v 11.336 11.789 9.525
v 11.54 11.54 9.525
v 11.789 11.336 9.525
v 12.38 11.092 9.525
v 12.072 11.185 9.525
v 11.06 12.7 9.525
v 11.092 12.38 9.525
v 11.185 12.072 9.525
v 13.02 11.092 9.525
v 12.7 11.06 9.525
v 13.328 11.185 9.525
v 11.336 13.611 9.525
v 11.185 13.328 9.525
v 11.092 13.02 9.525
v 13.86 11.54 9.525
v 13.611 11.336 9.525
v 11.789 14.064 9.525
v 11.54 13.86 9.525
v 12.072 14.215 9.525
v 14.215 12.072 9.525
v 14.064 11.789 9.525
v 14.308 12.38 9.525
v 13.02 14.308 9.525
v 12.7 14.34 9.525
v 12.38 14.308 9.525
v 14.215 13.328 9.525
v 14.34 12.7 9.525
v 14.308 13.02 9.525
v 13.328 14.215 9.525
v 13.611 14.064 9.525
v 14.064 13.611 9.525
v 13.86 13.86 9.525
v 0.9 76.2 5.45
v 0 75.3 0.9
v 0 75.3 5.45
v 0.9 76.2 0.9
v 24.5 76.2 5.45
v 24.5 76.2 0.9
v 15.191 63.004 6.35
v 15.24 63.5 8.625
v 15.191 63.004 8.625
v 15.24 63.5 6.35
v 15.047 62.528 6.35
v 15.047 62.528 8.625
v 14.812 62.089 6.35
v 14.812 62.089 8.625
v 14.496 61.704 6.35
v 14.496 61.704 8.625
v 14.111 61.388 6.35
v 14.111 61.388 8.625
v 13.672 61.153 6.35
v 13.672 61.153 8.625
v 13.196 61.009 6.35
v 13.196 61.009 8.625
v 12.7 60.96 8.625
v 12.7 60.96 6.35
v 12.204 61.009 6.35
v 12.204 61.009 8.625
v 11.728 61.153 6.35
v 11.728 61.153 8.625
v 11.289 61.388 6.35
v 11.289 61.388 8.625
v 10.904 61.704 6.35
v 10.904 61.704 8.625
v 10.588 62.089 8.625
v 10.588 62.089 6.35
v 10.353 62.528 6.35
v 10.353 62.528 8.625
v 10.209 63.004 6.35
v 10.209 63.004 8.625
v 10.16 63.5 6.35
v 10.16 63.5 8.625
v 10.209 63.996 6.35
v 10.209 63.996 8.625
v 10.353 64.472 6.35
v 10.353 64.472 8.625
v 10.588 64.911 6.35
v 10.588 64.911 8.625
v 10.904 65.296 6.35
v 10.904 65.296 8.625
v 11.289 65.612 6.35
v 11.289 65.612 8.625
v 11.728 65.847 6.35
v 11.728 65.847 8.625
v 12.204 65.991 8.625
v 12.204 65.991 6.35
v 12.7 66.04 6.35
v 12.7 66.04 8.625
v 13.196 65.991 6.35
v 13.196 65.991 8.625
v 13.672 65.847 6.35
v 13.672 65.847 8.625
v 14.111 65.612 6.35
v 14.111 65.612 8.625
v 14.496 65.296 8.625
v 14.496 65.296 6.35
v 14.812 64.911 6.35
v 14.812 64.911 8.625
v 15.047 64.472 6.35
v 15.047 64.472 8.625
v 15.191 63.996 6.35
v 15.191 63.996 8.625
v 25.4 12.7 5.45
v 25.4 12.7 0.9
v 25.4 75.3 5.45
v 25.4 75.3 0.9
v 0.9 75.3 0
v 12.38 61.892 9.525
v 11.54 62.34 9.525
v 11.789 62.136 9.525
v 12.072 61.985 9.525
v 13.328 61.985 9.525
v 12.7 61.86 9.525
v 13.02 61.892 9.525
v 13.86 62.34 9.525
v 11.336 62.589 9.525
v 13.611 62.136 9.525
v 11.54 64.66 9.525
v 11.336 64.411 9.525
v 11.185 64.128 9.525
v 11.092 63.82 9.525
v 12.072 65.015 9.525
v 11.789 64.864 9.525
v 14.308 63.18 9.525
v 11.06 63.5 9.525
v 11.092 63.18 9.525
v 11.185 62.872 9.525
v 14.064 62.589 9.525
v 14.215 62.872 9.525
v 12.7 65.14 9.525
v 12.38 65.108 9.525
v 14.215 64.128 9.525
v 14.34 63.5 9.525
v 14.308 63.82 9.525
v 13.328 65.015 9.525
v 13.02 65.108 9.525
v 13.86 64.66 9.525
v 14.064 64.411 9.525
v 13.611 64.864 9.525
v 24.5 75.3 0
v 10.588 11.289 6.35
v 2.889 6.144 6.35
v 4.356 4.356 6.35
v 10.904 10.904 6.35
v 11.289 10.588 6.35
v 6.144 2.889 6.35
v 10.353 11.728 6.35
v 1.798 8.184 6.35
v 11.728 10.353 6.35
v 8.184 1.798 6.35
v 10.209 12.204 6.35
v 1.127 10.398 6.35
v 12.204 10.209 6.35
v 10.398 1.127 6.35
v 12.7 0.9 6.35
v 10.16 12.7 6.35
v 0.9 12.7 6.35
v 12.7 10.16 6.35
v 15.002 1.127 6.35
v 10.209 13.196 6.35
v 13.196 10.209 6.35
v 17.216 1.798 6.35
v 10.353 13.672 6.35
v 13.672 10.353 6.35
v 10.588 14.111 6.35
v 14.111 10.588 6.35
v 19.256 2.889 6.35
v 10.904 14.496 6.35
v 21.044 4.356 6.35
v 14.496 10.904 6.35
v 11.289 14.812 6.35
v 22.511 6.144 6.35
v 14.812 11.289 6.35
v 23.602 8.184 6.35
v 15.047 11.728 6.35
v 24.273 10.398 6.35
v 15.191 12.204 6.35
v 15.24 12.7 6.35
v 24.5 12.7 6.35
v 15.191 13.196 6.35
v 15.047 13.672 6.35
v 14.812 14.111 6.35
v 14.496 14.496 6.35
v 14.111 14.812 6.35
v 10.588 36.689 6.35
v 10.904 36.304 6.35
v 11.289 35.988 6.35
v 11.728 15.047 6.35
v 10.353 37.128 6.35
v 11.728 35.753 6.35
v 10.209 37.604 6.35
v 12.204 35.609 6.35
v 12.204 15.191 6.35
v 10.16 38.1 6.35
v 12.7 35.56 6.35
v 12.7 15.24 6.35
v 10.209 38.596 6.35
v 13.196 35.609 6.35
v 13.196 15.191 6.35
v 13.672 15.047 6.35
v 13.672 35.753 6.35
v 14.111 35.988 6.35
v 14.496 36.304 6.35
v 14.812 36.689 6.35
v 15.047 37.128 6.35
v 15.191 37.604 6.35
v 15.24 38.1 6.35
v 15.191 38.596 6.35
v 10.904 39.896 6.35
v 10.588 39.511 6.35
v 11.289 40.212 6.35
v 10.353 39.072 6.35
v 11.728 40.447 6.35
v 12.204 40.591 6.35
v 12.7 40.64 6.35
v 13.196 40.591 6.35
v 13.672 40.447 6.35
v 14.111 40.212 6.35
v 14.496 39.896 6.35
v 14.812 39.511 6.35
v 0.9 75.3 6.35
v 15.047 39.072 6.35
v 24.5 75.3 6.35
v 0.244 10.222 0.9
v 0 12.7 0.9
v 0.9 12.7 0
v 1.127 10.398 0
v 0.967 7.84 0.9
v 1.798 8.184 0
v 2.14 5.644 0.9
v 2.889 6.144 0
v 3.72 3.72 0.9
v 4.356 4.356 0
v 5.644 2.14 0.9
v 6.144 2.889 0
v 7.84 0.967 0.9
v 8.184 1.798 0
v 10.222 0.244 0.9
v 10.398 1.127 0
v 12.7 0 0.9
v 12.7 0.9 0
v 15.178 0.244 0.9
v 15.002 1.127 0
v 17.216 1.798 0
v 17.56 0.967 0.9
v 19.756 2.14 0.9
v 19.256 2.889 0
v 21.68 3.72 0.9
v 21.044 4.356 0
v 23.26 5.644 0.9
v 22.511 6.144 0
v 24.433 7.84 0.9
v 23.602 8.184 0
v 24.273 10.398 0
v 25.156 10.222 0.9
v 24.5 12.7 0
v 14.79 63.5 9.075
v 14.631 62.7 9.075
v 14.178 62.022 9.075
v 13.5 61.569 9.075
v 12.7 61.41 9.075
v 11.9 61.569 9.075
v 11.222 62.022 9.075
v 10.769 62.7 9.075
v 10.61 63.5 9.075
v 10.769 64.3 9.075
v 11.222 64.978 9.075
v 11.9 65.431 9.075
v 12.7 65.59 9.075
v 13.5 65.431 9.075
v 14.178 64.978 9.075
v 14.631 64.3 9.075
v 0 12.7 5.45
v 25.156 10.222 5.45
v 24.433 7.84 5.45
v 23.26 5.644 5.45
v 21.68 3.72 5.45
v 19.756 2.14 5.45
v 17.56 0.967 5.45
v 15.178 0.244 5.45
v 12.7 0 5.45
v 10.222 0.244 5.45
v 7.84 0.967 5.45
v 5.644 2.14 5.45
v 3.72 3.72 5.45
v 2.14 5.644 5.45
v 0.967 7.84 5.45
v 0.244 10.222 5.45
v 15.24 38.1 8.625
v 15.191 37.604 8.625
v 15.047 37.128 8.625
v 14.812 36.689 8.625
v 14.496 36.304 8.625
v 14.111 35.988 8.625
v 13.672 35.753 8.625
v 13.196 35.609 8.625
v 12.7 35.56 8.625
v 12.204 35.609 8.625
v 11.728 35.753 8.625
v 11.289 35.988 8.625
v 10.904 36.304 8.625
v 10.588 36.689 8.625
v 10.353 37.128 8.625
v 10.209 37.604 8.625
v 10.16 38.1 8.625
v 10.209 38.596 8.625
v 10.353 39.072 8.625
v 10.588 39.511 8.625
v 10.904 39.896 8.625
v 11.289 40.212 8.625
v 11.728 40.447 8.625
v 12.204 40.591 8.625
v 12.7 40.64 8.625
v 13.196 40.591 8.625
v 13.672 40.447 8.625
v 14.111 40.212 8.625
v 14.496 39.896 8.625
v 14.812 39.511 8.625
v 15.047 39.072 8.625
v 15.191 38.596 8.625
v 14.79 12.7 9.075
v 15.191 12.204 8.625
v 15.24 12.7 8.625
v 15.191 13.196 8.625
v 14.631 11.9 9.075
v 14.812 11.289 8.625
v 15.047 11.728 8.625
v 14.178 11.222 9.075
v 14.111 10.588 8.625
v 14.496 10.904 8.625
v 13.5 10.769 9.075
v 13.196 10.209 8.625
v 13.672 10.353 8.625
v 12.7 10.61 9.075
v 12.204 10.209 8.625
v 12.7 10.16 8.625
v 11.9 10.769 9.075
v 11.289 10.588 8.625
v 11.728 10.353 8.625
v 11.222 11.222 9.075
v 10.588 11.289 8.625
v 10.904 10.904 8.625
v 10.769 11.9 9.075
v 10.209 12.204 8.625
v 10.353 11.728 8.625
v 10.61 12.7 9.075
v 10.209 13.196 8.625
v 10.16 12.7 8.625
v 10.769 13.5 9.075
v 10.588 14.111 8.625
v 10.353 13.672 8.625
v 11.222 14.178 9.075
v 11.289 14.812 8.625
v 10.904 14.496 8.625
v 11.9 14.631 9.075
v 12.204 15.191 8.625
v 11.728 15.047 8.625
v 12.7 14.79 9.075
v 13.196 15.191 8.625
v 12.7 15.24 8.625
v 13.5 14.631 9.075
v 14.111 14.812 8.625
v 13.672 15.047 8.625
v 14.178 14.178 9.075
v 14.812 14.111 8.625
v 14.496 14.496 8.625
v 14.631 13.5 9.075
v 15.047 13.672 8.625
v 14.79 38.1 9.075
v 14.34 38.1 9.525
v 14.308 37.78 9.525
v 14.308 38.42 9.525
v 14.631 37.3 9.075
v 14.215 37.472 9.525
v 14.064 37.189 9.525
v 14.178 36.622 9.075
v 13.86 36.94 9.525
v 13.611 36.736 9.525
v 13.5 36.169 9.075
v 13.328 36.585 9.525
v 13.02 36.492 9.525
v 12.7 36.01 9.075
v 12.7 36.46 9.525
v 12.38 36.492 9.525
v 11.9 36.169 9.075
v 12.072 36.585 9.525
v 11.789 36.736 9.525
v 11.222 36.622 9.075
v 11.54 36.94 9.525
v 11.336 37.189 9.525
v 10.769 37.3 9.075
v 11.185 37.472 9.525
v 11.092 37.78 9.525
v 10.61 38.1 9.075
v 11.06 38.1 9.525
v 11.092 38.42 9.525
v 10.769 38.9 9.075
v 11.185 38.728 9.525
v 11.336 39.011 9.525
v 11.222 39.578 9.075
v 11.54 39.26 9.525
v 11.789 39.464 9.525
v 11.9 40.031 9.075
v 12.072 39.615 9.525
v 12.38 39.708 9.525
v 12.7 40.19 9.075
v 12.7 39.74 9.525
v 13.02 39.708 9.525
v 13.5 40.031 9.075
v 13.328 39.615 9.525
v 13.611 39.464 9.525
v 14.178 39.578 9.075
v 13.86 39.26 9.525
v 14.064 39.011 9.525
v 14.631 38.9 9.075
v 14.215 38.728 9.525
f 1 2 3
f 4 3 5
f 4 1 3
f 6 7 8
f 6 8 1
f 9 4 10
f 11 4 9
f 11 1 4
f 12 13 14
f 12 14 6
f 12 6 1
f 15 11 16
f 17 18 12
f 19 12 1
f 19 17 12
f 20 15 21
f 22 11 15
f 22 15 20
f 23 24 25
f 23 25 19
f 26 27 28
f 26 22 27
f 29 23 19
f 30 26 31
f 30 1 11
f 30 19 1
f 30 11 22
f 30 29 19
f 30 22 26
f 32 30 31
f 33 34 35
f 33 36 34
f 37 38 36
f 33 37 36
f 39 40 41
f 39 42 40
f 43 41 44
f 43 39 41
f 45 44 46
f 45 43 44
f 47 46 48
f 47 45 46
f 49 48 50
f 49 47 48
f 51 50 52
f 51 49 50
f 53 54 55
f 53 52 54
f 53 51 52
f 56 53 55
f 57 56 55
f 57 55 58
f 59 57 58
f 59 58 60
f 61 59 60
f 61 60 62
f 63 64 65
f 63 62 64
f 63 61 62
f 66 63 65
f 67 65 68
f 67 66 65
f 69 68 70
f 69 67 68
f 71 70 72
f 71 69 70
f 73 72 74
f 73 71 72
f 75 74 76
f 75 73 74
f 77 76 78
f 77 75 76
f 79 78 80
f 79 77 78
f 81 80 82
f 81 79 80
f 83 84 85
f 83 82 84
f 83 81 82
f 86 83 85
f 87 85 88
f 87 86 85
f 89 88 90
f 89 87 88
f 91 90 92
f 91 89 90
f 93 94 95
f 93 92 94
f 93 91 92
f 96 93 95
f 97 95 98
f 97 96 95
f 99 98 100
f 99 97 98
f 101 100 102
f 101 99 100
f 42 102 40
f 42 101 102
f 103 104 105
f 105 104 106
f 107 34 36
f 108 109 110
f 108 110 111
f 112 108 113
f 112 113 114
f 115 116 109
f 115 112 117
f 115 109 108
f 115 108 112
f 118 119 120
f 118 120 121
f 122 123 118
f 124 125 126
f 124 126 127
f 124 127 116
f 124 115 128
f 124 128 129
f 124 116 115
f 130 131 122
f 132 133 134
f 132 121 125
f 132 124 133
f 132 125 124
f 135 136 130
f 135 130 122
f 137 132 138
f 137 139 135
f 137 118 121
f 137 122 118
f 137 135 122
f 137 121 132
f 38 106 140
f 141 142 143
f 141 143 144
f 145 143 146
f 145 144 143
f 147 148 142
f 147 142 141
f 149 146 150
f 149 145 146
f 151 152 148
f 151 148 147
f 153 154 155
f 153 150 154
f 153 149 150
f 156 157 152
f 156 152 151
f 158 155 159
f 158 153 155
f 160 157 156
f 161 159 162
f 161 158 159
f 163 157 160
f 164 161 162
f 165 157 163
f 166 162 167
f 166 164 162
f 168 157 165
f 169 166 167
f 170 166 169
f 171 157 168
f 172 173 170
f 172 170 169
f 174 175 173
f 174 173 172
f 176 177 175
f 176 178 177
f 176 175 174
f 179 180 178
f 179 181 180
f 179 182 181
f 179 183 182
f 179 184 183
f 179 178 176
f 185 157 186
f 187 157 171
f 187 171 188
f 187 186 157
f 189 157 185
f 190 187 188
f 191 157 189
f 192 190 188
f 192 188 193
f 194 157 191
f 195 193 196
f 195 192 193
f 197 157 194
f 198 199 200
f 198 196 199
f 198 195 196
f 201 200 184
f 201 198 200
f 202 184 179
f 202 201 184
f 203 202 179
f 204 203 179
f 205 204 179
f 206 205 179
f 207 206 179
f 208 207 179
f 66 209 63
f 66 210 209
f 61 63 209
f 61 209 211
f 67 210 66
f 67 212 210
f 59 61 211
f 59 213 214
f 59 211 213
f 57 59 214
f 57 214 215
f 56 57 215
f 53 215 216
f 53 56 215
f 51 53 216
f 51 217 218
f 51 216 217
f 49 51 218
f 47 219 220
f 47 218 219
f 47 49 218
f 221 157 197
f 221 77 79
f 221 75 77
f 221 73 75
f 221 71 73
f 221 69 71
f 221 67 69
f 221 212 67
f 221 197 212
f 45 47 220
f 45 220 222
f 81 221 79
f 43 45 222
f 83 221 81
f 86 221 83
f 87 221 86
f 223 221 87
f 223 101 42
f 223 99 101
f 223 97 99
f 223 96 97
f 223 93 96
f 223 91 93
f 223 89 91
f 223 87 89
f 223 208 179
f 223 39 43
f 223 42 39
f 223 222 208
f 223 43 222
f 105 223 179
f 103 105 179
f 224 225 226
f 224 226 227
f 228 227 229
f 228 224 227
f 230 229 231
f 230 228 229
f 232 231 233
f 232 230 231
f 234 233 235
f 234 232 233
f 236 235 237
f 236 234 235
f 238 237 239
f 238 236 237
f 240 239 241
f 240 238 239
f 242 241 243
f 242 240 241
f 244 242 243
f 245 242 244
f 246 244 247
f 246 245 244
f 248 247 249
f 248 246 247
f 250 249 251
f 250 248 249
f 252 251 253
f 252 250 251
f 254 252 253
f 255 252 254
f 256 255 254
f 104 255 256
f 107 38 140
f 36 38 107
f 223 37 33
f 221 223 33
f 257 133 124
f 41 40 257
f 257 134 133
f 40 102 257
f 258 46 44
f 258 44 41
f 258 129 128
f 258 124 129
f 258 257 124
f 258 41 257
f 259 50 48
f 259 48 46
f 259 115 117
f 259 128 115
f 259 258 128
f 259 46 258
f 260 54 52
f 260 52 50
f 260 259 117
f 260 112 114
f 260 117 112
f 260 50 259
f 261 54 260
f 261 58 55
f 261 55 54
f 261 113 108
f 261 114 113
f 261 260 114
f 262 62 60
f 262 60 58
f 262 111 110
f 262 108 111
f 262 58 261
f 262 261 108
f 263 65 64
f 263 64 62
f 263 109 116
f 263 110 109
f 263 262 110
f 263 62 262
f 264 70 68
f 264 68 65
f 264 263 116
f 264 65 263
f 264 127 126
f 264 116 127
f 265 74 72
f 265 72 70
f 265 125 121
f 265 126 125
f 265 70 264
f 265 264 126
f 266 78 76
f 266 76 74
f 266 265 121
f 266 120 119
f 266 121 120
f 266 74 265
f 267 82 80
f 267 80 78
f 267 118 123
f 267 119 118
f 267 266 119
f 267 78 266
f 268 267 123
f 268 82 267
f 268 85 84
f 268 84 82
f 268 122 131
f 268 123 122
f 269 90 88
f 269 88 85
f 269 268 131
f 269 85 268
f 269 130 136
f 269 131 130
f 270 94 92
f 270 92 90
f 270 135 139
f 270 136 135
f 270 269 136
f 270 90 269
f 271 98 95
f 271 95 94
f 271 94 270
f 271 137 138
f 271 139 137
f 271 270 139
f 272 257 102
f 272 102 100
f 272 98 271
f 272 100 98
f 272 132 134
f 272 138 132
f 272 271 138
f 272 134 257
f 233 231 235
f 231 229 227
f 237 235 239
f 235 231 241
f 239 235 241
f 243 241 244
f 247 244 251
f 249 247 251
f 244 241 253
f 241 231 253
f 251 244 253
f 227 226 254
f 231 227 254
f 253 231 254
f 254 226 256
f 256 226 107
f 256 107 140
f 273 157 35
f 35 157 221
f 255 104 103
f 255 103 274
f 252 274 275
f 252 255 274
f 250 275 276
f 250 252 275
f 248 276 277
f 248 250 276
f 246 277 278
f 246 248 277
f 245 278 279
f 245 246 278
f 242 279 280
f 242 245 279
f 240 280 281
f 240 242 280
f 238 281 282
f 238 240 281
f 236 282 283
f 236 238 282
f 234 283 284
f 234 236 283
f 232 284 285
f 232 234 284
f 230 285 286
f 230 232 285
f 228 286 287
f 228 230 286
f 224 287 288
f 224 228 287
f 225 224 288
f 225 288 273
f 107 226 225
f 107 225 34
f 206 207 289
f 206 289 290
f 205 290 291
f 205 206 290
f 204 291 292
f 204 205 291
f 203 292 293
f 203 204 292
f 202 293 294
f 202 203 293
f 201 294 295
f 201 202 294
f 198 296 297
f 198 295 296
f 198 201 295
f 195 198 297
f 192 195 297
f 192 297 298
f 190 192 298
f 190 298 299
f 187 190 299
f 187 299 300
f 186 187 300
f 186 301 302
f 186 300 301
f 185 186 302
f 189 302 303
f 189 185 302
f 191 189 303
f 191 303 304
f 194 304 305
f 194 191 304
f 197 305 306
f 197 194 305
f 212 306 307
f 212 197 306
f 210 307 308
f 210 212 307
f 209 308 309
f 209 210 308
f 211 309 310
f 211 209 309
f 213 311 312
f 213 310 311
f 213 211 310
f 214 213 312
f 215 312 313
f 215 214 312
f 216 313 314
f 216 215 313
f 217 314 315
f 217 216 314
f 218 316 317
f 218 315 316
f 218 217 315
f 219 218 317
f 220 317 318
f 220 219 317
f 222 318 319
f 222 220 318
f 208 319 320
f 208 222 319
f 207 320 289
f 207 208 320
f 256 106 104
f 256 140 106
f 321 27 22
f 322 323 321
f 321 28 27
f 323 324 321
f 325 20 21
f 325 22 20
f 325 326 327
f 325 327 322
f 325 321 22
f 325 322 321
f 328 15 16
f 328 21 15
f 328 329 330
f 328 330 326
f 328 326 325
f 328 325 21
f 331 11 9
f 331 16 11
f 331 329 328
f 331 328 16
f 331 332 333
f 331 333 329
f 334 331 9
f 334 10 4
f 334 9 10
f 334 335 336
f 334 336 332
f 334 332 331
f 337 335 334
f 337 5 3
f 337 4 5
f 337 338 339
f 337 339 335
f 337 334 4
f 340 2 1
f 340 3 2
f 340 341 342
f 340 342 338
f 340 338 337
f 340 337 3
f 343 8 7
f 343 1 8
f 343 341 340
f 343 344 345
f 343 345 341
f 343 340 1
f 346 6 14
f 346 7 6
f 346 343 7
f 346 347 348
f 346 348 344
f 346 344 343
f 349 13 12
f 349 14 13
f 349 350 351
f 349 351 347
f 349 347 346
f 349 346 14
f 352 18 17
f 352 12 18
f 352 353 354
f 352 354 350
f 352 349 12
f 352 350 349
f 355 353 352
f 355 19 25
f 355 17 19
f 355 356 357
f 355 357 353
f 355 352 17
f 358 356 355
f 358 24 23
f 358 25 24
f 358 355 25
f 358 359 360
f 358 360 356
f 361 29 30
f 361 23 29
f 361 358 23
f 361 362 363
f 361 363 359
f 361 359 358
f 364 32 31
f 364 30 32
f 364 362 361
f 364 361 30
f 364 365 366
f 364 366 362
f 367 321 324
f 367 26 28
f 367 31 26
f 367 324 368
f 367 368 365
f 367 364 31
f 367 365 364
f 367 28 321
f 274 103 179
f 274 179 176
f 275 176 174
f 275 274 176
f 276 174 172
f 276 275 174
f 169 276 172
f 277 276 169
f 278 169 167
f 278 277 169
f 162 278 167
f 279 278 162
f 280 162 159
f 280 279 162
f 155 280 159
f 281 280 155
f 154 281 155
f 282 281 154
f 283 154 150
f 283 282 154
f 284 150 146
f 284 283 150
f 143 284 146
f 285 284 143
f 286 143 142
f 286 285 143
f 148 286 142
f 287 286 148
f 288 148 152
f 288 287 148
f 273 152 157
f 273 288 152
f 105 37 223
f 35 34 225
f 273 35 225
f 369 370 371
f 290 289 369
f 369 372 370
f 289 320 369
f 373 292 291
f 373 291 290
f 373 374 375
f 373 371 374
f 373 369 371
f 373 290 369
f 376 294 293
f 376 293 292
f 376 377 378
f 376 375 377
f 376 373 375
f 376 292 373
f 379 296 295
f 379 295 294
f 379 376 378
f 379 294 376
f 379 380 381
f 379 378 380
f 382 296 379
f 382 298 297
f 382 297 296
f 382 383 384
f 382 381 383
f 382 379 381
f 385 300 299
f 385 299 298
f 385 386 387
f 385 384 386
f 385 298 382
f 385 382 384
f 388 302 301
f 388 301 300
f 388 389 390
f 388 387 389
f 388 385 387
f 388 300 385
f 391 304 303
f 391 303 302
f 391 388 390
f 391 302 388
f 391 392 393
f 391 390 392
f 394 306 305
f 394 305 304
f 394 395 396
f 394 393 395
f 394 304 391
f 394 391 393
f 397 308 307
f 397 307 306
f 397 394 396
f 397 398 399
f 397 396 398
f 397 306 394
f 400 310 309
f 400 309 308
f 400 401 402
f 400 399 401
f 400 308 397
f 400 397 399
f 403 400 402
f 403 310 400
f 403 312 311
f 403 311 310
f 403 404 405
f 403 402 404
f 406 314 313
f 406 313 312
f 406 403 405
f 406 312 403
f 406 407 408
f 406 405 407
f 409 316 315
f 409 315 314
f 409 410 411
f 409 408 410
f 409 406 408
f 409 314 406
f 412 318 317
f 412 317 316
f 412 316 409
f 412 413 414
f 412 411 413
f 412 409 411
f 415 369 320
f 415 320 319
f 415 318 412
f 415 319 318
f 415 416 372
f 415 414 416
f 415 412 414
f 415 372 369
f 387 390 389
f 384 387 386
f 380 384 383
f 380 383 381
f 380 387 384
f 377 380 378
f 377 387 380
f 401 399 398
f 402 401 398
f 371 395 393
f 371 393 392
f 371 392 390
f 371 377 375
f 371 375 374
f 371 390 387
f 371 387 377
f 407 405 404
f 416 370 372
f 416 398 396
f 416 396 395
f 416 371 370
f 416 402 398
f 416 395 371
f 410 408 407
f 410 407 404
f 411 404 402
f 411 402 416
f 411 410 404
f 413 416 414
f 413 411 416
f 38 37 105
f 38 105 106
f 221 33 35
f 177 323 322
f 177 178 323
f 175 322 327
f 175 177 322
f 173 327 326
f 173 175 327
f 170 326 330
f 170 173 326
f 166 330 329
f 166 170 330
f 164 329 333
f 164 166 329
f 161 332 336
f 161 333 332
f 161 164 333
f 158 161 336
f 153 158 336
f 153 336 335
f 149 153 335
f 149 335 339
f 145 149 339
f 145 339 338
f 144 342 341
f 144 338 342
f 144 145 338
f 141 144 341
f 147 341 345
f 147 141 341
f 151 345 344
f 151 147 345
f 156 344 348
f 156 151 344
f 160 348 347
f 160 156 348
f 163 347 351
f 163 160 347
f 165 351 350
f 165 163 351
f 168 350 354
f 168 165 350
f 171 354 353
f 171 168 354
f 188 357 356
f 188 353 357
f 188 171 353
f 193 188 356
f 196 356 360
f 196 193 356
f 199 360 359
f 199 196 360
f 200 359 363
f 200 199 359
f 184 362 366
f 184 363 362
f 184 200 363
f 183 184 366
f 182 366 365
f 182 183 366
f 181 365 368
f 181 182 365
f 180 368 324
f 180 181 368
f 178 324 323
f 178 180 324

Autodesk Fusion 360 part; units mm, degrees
sketch "Sketch1" plane through (0, 0, 0) normal (0, 0, 1) x (1, 0, 0)
  line L0 (0, 0) -> (25.4, 0)
  line L1 (25.4, 0) -> (25.4, 63.5)
  line L2 (25.4, 63.5) -> (0, 63.5) construction
  line L3 (0, 63.5) -> (0, 0)
  line L4 (25.4, 63.5) -> (25.4, 76.2)
  line L5 (25.4, 76.2) -> (0, 76.2)
  line L6 (0, 76.2) -> (0, 63.5)
  circle A0 centre (12.7, 63.5) radius 2.54
  circle A1 centre (12.7, 38.1) radius 2.54
  circle A2 centre (12.7, 12.7) radius 2.54
  circle A3 centre (12.7, 12.7) radius 12.7
  dimension "d8" = 25.4
  dimension "d9" = 63.5
  dimension "d11" = 12.7
  dimension "d12" = 5.08
  dimension "d15" = 25.4
  dimension "d16" = 0
extrude "Extrude1" add sketch "Sketch1" along normal blind 6.35 contours A3 | L1 L3 L4 L5 L6 A3 | A0 | A1 | A2
extrude "Extrude2" add sketch "Sketch1" along normal blind 3.175 from surface at 6.35 contours A0 | A1 | A2
chamfer "Chamfer1" distance 0.9 angle 45 9 edges at (10.3319, 11.7815, 9.525) (10.3319, 37.1815, 9.525) (10.3319, 62.5815, 9.525) (25.4, 76.2, 3.175) (0, 76.2, 3.175) (12.7, 76.2, 6.35) (0, 44.45, 6.35) (12.7, 0, 6.35) (25.4, 44.45, 6.35) 1 faces at (8.4667, 33.8667, 0)
equation "CUT_DISTANCE = 0.5 in" comment "Cutting edge tip"
equation "TUBE_WIDTH = 1 in" comment "Width of  tubing"
equation "PIN_SPACING = 1 in" comment "Spacing of holes"
equation "PIN_DIAMETER = 0.2 in" comment "Pin size"
equation "GUIDE_THICKNESS = 0.25 in" comment "Thickness of guide"
equation "PIN_LENGTH = 0.125 in" comment "Height of pin"
equation "PRINTER_LAYER_HEIGHT = 0.3 mm" comment "Layer height for chamfer"
equation "d8 = TUBE_WIDTH"
equation "d9 = PIN_SPACING * ( PIN_COUNT - 0.5 )"
equation "PIN_COUNT = 3" comment "# of pins"
equation "d11 = CUT_DISTANCE"
equation "d12 = PIN_DIAMETER"
equation "d13 = PIN_COUNT"
equation "d15 = PIN_SPACING"
equation "d17 = GUIDE_THICKNESS"
equation "d20 = PIN_LENGTH"
equation "d22 = PRINTER_LAYER_HEIGHT * 3"
